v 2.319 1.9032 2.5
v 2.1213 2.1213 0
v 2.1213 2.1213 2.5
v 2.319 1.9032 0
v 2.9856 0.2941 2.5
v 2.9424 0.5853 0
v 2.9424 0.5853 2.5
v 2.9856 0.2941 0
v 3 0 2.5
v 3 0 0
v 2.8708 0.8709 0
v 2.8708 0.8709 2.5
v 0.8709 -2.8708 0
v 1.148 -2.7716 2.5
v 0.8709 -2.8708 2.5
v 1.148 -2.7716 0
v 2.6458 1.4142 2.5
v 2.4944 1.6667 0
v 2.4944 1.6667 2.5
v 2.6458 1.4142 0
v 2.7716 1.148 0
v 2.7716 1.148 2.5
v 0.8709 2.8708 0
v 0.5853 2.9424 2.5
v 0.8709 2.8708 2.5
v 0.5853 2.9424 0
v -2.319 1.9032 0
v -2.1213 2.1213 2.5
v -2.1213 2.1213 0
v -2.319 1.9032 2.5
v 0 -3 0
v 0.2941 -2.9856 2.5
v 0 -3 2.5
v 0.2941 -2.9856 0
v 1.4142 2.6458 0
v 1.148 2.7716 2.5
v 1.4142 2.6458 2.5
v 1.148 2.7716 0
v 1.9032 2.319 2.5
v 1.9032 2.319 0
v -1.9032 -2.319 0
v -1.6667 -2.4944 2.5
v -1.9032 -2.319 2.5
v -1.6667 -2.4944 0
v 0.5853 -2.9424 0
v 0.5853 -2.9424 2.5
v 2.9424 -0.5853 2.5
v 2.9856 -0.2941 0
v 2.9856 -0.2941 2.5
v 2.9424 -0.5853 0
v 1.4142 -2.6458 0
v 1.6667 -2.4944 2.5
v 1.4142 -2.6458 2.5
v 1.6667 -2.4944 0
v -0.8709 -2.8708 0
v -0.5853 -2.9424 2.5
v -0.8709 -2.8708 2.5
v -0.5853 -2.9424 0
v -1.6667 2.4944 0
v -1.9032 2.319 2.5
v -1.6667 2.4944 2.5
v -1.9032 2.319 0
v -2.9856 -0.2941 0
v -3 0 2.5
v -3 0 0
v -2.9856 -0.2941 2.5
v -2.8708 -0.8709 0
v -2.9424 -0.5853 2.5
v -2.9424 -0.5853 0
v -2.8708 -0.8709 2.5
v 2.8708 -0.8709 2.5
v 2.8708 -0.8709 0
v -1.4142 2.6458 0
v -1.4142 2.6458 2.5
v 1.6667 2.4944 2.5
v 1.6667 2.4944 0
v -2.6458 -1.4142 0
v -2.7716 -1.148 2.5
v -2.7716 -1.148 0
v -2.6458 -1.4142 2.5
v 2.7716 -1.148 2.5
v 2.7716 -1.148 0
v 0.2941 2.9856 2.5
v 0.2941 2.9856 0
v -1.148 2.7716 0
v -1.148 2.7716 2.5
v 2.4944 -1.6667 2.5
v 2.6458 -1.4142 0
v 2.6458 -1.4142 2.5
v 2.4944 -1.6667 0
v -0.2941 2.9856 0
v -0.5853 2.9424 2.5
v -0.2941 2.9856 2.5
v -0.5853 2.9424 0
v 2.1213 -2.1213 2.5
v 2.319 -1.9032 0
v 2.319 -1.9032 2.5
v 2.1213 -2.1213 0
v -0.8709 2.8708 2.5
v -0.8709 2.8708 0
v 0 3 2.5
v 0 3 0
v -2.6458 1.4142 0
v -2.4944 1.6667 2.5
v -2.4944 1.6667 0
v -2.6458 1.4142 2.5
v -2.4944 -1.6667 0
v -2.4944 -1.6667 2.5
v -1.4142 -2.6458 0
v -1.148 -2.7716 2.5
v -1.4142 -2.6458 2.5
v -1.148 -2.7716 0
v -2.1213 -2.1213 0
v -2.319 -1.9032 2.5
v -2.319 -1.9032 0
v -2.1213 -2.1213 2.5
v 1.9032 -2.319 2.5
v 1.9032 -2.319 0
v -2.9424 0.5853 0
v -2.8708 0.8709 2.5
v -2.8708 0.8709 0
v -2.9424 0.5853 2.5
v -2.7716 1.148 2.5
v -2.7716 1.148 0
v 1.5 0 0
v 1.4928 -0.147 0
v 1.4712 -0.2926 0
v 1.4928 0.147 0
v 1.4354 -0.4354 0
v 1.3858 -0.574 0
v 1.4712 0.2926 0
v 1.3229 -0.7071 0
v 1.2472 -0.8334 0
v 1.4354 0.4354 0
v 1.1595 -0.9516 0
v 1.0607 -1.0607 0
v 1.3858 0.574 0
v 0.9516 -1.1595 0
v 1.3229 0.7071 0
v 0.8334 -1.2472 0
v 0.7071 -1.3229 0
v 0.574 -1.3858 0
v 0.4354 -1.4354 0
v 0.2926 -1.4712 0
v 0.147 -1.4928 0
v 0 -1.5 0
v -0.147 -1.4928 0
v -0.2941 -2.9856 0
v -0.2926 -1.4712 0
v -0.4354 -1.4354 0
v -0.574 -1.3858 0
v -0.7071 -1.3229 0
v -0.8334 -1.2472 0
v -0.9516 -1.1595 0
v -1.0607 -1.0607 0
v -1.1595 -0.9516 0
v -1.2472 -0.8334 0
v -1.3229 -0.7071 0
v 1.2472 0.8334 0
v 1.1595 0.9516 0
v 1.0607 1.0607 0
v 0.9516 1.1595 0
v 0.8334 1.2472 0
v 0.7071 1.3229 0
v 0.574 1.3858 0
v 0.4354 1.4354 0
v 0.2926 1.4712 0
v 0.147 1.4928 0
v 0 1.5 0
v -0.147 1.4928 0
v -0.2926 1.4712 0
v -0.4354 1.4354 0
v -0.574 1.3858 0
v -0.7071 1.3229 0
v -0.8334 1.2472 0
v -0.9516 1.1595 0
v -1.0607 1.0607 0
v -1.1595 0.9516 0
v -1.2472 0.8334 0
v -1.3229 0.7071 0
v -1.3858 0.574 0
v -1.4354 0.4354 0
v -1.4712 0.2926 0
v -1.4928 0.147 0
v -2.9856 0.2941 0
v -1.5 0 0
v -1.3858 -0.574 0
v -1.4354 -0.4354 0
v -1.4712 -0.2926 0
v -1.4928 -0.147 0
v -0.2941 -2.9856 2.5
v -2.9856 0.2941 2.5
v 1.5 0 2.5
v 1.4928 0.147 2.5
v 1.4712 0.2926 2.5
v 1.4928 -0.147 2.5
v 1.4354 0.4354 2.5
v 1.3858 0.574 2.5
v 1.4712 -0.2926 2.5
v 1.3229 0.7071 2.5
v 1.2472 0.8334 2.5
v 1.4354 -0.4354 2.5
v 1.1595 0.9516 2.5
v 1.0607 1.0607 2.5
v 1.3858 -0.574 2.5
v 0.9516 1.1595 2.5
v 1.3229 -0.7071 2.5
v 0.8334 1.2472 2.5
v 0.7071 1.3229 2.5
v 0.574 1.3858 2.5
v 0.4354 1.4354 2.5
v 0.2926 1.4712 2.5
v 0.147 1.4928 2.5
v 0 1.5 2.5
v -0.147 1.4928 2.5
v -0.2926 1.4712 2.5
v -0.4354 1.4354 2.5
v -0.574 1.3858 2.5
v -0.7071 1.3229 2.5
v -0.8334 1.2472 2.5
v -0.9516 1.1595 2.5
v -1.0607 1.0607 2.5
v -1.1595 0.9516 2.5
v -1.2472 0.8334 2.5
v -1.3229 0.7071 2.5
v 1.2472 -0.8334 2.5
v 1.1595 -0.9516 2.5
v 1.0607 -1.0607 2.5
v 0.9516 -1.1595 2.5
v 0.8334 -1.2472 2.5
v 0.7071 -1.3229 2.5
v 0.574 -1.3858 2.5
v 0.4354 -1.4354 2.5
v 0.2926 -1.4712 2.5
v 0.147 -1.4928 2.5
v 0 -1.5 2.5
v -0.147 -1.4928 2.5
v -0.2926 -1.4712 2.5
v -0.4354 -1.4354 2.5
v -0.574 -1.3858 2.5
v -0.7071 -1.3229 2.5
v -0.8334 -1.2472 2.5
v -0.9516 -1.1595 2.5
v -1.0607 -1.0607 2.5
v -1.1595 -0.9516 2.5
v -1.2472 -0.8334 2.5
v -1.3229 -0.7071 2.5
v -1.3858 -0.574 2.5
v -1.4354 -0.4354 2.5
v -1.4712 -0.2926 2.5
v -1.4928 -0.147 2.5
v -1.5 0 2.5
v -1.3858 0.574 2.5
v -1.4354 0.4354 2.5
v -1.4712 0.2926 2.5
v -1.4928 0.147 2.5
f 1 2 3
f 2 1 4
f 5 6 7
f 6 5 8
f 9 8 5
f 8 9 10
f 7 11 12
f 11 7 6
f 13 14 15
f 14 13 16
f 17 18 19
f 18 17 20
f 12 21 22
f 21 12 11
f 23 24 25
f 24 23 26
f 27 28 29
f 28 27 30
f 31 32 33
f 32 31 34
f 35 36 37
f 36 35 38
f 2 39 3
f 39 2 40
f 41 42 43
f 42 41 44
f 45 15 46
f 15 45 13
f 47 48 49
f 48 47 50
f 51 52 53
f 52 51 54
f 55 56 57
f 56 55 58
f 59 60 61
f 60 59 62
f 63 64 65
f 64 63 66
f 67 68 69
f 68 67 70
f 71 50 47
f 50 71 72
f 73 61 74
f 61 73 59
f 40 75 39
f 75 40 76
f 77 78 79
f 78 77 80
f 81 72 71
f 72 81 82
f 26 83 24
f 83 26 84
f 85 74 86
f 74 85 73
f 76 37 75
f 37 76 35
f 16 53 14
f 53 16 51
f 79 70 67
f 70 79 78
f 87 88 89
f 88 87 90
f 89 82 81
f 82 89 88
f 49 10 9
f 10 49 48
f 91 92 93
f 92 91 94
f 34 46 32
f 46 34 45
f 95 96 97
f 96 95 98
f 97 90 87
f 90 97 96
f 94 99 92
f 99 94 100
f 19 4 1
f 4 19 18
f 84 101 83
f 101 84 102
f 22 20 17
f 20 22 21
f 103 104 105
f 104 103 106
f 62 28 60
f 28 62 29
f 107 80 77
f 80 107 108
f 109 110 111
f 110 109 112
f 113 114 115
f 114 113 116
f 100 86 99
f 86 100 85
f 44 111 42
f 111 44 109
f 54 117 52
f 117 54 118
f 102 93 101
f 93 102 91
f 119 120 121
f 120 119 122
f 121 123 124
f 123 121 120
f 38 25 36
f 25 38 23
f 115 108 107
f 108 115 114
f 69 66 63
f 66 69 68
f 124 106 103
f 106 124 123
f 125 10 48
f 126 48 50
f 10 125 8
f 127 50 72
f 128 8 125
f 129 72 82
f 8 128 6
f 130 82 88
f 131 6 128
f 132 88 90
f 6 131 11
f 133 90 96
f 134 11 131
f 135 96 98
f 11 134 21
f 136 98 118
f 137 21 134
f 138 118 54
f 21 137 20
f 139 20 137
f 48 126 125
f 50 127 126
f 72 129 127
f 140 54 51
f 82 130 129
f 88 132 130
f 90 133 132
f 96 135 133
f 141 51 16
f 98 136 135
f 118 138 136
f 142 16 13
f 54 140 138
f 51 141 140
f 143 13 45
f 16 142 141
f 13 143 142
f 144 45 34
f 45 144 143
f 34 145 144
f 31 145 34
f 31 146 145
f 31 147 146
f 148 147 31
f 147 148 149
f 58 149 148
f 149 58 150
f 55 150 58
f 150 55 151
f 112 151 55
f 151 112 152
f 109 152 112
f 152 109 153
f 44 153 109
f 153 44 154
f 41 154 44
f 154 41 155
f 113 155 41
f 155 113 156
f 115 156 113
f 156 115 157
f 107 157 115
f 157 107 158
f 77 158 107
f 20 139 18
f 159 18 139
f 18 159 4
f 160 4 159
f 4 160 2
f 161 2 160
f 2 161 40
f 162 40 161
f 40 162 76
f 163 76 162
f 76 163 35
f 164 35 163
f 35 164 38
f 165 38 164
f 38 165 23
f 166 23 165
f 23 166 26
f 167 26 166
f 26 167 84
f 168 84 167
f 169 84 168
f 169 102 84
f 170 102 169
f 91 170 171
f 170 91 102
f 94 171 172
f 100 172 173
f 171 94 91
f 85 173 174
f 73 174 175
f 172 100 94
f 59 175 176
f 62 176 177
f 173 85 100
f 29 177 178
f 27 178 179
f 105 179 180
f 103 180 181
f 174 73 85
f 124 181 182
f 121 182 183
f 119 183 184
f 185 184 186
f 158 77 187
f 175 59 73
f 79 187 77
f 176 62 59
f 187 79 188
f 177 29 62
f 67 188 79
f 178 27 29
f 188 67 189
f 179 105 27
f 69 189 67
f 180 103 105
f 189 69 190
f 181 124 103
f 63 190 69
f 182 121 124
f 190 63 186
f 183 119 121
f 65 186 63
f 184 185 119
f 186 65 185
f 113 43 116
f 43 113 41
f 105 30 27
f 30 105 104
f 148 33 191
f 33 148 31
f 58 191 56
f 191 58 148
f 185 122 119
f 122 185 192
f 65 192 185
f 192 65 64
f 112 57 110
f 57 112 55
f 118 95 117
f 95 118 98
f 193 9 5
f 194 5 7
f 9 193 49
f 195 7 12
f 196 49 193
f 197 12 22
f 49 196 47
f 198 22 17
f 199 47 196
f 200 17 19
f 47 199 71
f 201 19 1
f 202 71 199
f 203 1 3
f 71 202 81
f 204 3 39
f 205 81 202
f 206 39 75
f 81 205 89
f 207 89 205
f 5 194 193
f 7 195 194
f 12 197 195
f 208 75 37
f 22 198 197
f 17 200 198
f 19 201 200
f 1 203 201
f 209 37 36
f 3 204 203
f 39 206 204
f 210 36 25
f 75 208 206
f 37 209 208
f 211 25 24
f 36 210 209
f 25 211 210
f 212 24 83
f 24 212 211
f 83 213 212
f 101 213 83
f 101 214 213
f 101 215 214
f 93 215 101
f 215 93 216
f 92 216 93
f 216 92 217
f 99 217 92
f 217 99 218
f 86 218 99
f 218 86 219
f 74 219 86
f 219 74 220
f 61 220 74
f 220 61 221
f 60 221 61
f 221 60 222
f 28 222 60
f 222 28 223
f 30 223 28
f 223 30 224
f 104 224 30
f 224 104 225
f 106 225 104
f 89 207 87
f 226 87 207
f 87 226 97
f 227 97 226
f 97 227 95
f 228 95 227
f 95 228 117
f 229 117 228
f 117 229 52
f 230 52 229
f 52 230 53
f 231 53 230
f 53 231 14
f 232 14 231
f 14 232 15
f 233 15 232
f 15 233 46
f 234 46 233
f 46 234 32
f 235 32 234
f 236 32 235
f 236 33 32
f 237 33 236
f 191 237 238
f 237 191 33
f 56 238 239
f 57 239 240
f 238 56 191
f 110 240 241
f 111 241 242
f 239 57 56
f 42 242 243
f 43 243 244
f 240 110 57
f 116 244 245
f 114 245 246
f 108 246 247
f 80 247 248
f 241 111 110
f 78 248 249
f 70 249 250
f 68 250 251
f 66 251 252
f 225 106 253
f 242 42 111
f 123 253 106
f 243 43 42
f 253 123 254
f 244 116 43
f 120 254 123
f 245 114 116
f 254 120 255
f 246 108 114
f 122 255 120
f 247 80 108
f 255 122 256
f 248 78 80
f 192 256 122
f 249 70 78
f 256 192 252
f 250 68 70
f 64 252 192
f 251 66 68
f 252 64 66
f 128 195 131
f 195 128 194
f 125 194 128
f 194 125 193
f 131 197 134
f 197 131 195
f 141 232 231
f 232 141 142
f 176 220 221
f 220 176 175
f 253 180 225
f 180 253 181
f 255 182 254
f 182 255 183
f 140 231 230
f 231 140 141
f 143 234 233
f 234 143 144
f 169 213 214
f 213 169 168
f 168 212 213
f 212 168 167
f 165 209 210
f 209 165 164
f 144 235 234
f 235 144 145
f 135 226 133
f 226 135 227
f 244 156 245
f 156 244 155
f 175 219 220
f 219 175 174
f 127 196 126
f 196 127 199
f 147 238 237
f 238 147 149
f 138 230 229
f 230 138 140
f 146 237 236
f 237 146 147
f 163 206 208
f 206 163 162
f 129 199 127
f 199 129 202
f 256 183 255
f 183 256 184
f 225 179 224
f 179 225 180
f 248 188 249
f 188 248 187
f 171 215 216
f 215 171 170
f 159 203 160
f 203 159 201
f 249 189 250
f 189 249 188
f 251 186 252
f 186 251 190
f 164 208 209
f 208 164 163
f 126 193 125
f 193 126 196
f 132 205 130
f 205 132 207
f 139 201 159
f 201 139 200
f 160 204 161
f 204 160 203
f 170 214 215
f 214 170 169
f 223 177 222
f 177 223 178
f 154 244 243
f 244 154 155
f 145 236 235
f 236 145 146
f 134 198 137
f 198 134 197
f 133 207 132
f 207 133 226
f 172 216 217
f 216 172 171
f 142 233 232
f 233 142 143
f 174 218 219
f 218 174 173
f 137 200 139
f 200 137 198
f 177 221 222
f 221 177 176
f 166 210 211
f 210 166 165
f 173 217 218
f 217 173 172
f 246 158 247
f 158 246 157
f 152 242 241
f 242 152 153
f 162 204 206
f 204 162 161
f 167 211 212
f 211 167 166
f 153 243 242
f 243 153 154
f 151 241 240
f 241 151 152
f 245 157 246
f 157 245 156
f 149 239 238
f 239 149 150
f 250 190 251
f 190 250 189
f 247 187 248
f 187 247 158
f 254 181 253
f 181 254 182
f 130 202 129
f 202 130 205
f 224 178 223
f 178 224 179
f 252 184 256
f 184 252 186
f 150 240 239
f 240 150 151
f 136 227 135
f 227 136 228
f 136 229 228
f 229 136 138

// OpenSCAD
module ball_bearing() {
    difference() {
        // Outer cylinder
        cylinder(h=2.5, d=6.0, $fn=64);
        
        // Inner bore
        translate([0, 0, -1])
            cylinder(h=4.5, d=3.0, $fn=64);
    }
}

ball_bearing();
